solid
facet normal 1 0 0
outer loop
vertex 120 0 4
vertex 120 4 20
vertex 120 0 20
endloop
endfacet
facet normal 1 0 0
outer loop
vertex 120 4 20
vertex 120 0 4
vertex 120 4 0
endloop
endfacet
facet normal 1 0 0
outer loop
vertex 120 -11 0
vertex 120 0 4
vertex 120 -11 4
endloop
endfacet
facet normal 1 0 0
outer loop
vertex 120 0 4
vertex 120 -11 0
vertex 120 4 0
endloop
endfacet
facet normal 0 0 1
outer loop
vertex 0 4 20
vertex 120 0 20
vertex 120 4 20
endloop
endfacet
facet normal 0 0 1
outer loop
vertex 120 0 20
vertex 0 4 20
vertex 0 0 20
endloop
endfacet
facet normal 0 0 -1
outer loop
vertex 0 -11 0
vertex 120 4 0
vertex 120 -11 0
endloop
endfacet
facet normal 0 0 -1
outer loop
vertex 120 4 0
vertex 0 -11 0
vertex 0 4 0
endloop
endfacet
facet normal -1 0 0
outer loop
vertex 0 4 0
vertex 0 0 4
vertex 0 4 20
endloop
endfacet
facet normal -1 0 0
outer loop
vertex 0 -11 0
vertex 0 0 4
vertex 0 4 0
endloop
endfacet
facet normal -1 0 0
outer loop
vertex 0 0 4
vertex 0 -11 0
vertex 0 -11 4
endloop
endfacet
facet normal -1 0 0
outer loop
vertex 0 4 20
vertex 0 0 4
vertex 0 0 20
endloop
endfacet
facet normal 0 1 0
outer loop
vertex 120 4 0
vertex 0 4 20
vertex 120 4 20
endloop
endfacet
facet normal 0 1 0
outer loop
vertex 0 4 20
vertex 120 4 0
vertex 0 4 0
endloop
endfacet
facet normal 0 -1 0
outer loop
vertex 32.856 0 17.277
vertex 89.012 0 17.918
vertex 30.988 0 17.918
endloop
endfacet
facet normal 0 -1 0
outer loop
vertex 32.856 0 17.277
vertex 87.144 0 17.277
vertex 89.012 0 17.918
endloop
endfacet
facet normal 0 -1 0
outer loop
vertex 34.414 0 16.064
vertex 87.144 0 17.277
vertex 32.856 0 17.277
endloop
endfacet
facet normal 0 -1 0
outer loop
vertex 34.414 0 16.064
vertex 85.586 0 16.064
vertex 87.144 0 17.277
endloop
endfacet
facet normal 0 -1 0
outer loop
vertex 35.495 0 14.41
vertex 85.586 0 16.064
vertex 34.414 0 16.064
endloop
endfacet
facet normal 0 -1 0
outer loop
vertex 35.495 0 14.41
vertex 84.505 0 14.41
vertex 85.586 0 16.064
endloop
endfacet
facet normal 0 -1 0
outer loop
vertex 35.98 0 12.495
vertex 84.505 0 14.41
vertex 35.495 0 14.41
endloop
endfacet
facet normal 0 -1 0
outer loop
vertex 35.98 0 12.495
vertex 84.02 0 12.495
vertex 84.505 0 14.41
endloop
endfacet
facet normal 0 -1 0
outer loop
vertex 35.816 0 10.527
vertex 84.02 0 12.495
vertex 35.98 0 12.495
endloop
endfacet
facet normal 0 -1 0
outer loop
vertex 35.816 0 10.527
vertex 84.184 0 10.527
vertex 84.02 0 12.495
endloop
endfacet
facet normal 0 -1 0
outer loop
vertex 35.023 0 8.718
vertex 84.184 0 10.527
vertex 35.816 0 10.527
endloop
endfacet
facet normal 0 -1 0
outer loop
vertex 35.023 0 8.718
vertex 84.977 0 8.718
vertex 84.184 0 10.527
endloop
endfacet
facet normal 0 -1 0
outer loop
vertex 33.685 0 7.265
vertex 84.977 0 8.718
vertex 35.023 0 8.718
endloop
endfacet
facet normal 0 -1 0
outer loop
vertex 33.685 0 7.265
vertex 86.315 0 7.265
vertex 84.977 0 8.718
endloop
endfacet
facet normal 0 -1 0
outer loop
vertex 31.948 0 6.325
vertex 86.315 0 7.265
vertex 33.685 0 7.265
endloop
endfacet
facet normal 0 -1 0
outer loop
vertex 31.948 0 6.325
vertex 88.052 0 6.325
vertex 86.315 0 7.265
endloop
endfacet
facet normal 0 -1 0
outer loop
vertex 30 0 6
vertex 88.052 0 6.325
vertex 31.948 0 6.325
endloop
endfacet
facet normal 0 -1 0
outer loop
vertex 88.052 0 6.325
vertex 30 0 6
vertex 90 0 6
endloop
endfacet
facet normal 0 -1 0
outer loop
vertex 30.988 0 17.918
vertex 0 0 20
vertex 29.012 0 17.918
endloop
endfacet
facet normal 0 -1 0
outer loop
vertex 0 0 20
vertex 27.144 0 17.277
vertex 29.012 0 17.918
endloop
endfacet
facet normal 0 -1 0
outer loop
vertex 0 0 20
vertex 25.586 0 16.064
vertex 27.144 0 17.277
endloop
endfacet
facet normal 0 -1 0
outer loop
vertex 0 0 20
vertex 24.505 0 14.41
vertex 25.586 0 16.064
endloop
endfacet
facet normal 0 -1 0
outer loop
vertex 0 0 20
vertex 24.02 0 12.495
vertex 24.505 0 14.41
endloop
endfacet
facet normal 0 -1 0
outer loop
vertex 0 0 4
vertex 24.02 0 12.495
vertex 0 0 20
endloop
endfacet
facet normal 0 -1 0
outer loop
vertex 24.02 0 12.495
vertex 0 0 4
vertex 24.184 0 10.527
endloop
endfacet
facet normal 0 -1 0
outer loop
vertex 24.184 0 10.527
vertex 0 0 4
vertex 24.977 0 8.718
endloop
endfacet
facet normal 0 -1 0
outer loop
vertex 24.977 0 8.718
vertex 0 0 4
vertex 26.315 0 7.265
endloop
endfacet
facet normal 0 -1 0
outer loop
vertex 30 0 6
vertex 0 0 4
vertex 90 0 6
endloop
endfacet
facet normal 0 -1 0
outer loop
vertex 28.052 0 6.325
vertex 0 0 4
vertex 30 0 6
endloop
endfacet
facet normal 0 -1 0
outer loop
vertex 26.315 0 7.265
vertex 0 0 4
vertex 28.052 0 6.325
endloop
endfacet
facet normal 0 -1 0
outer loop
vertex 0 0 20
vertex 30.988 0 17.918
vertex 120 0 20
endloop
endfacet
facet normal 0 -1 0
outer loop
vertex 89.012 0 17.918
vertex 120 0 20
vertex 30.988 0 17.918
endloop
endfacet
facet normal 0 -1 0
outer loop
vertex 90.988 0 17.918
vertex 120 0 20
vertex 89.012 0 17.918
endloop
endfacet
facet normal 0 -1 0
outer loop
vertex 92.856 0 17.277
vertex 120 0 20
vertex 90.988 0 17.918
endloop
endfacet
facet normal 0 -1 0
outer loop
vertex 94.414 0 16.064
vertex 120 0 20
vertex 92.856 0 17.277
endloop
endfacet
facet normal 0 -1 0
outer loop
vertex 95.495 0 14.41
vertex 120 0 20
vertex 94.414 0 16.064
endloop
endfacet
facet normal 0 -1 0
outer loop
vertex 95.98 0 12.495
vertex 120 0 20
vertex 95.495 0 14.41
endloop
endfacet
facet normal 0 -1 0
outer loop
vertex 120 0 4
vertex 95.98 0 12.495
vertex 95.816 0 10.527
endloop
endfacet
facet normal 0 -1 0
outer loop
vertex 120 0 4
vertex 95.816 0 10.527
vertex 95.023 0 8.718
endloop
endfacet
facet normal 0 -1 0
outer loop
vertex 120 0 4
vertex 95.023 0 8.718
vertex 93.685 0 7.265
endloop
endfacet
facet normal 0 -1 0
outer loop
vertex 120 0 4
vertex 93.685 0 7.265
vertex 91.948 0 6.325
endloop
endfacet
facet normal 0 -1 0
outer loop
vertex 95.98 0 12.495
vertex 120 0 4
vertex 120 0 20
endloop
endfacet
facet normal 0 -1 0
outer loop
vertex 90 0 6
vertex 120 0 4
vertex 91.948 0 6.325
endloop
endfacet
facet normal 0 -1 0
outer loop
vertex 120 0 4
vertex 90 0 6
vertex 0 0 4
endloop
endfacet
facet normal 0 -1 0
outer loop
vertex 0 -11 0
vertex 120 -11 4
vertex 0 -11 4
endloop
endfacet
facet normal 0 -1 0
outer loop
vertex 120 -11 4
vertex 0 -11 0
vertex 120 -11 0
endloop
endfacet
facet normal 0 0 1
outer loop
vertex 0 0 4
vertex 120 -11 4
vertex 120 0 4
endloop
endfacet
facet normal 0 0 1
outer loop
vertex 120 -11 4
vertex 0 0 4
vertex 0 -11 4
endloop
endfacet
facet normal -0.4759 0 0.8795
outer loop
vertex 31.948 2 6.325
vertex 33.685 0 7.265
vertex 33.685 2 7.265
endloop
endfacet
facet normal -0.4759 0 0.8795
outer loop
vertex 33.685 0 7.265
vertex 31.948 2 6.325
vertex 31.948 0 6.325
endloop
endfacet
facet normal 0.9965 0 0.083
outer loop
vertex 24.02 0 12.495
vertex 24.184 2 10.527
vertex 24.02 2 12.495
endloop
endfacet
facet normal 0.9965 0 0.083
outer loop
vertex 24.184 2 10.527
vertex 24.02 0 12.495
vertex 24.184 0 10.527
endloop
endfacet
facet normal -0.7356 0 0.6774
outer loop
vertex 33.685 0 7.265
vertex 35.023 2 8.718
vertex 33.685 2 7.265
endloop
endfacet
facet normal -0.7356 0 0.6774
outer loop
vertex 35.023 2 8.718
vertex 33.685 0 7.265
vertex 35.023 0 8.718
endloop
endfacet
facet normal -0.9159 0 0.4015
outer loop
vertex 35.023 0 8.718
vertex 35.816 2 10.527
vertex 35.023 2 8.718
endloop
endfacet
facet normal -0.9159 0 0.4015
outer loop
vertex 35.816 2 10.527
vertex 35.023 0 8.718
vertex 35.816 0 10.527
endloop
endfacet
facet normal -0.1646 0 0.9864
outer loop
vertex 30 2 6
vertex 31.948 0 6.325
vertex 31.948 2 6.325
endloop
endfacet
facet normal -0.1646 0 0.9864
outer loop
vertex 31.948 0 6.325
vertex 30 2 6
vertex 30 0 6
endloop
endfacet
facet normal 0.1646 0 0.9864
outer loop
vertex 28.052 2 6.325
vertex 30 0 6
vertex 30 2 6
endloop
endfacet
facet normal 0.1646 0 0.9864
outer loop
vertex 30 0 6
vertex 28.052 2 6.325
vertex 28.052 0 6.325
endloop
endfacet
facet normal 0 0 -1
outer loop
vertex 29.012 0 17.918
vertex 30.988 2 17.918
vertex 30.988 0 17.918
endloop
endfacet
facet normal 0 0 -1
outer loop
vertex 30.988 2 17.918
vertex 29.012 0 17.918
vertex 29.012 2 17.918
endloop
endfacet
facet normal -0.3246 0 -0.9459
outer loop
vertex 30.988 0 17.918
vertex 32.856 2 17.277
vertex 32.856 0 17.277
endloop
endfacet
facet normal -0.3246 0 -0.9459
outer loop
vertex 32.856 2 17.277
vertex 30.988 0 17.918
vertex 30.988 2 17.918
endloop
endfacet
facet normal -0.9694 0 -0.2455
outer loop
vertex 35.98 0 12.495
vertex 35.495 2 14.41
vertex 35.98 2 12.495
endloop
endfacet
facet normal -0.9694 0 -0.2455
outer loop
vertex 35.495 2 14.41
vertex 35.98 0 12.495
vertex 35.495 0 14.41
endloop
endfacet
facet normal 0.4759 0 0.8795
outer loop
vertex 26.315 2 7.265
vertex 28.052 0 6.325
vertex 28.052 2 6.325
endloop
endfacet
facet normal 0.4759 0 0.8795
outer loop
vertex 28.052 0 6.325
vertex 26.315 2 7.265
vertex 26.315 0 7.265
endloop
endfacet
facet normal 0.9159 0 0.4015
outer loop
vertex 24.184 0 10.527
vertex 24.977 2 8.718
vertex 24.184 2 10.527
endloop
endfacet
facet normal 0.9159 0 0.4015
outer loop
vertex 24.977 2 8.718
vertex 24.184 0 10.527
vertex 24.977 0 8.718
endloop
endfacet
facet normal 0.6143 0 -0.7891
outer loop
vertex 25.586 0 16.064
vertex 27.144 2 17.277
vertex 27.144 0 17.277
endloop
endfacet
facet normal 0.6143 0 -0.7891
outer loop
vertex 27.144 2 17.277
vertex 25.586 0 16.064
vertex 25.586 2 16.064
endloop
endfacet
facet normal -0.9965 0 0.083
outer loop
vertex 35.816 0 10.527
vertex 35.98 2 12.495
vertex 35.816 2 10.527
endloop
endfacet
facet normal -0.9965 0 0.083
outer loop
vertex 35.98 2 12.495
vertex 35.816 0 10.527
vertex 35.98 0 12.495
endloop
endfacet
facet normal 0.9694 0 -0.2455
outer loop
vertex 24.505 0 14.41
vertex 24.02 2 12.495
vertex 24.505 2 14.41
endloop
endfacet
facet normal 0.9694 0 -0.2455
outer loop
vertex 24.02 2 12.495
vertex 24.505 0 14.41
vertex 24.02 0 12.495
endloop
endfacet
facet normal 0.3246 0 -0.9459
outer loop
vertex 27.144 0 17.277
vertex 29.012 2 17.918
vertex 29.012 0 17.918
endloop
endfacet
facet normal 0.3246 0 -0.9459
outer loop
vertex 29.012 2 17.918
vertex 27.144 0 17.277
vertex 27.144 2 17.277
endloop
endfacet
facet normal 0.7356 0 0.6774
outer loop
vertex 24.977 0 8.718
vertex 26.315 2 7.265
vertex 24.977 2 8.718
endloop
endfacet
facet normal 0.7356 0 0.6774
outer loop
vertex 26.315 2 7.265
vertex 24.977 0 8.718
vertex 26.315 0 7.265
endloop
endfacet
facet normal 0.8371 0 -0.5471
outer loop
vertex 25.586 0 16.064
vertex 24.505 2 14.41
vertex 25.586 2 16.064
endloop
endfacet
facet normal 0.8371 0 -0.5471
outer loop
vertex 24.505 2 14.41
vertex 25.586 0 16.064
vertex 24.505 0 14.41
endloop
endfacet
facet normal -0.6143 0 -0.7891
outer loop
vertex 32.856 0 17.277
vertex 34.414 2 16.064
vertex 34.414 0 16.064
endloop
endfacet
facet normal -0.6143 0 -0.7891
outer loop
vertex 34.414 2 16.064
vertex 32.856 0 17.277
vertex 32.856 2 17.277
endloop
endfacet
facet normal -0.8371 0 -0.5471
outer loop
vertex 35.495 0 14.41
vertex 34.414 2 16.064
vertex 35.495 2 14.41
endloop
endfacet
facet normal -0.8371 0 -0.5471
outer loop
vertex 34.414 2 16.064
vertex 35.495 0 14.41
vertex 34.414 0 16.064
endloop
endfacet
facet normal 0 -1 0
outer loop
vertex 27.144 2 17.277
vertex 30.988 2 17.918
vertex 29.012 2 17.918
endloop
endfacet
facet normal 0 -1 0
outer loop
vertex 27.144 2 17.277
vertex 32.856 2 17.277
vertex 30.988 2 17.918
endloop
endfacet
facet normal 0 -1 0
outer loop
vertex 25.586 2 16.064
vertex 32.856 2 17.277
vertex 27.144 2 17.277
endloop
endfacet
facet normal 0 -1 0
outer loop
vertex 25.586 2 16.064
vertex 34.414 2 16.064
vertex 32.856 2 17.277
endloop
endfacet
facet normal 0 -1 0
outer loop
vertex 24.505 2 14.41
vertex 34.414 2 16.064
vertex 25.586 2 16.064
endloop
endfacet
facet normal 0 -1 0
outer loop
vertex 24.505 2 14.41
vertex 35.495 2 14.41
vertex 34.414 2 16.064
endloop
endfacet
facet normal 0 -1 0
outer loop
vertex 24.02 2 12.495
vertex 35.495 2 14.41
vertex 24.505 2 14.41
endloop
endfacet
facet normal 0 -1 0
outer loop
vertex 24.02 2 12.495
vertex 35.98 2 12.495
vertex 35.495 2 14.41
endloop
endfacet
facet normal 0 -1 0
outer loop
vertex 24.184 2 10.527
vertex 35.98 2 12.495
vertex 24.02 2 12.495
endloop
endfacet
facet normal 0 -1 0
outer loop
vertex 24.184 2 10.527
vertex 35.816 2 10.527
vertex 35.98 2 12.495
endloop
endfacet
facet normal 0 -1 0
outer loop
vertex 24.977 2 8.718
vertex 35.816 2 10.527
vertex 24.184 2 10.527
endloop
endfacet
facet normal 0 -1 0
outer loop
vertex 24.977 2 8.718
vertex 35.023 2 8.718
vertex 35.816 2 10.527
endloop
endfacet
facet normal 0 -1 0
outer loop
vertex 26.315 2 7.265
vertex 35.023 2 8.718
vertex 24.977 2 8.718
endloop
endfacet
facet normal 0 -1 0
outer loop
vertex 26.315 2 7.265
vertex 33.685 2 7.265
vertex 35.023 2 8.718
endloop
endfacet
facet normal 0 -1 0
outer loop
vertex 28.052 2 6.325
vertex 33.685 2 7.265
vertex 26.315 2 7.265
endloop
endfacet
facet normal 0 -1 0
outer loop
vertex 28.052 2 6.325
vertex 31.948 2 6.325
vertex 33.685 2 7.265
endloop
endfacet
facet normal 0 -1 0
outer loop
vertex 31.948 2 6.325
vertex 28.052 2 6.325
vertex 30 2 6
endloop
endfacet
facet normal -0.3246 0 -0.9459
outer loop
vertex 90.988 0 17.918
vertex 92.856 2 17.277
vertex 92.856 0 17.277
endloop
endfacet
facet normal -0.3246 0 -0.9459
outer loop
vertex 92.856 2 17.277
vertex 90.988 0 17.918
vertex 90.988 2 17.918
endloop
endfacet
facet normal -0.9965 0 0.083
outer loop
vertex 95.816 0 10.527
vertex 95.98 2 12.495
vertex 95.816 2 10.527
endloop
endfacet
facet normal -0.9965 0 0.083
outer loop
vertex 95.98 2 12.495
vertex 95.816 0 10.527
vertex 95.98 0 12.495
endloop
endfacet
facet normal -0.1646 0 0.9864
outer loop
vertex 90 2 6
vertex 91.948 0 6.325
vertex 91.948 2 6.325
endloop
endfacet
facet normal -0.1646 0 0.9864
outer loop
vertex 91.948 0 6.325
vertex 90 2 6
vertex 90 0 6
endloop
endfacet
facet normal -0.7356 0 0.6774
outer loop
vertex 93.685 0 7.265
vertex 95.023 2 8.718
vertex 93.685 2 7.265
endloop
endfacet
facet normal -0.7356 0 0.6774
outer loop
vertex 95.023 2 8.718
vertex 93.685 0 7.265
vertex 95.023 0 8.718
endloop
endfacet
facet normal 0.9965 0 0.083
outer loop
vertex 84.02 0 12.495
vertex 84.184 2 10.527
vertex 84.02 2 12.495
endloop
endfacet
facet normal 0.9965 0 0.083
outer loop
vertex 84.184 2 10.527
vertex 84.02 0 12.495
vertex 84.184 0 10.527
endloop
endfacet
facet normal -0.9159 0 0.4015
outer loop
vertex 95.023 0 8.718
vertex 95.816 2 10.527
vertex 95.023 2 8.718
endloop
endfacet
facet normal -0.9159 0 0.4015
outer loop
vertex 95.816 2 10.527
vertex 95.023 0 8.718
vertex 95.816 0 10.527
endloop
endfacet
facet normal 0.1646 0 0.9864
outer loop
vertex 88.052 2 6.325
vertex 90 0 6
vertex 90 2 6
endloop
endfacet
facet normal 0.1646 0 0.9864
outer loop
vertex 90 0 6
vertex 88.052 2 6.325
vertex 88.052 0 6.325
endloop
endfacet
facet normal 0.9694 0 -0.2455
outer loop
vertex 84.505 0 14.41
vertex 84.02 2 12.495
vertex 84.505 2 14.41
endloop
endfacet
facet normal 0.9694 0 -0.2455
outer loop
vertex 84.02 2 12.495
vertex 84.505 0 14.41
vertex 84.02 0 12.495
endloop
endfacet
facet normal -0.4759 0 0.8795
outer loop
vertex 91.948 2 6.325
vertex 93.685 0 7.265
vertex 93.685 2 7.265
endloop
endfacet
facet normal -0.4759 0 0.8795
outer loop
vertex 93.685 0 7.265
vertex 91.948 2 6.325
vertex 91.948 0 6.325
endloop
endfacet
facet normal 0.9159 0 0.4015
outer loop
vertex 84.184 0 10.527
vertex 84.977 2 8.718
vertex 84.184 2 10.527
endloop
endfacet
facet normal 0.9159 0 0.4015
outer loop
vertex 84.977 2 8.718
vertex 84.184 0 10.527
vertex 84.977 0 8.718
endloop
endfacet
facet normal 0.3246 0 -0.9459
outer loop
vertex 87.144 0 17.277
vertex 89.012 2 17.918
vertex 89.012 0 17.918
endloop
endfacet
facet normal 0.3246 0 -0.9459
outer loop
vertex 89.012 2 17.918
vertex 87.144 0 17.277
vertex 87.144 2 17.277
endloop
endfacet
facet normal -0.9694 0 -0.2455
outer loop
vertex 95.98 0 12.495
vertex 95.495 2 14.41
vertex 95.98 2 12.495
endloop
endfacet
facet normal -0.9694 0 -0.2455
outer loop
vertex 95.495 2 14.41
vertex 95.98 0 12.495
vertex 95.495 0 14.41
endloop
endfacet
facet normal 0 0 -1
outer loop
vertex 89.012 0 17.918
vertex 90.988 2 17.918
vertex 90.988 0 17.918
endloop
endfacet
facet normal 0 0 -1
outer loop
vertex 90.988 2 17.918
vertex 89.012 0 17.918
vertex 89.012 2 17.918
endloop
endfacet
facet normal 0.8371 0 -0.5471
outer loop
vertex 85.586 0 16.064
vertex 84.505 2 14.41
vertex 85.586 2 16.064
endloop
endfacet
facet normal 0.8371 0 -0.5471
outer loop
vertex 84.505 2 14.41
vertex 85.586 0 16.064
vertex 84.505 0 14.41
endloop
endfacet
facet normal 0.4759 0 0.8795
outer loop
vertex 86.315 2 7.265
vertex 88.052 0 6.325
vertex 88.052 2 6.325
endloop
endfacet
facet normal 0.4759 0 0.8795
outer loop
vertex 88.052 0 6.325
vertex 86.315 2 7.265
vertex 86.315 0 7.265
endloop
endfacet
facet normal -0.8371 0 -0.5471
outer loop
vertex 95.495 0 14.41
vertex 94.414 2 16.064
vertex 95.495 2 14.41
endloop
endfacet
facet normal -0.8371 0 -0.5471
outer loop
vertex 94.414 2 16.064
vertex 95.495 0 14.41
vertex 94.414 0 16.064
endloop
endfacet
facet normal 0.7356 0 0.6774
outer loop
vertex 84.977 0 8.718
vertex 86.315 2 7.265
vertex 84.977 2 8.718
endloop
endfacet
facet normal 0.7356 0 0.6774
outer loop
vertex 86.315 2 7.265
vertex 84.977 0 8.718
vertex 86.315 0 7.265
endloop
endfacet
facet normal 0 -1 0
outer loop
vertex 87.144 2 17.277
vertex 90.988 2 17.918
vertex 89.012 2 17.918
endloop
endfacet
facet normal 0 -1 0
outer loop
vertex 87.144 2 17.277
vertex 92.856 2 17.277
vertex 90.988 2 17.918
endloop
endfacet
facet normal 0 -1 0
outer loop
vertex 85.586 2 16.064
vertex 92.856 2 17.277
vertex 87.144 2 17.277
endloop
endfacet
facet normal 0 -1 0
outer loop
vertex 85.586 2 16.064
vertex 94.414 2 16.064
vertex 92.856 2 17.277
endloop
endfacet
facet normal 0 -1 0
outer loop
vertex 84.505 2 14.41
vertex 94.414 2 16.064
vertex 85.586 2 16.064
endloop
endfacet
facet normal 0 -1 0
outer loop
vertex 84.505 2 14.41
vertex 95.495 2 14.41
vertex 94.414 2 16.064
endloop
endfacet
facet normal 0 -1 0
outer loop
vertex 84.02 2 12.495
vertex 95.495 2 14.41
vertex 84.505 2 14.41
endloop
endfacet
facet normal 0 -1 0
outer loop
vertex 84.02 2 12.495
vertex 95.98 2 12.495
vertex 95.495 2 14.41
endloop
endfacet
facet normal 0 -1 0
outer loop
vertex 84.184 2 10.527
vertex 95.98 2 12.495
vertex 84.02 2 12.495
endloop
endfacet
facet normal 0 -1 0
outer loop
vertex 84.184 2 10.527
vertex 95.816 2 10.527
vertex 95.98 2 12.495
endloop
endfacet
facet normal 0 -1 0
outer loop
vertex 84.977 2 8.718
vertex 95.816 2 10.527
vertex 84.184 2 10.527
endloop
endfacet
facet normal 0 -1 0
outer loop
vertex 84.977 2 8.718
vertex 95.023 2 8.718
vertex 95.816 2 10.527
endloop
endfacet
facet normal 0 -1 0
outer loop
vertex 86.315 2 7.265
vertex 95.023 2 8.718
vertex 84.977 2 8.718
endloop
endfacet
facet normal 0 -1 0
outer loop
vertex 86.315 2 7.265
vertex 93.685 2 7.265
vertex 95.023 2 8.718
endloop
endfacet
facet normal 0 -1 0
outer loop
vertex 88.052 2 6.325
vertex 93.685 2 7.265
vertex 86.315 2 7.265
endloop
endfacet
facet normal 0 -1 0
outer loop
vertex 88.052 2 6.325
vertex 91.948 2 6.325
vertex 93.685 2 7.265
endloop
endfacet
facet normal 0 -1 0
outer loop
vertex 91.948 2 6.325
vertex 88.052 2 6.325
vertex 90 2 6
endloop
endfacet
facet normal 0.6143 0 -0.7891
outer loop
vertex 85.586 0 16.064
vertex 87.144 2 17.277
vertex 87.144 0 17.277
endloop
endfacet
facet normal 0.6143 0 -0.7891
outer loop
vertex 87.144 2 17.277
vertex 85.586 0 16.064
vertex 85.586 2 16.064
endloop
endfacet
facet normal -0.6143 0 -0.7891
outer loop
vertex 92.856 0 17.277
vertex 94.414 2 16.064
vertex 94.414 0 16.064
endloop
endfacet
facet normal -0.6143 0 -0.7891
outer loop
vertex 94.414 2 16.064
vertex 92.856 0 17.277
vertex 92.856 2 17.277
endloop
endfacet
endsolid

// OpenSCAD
//jaw = cube([116,8,11]);

difference() {
  union() {
    cube([120,4,20]);
    translate([0,4,0])
      rotate([90,00,0])
      cube([120,4,15]);
  }
  #translate([30,2,12])
    rotate([90,90,0])
    cylinder(r=6, h=3);
  #translate([90,2,12])
    rotate([90,90,0])
    cylinder(r=6, h=3);
}
